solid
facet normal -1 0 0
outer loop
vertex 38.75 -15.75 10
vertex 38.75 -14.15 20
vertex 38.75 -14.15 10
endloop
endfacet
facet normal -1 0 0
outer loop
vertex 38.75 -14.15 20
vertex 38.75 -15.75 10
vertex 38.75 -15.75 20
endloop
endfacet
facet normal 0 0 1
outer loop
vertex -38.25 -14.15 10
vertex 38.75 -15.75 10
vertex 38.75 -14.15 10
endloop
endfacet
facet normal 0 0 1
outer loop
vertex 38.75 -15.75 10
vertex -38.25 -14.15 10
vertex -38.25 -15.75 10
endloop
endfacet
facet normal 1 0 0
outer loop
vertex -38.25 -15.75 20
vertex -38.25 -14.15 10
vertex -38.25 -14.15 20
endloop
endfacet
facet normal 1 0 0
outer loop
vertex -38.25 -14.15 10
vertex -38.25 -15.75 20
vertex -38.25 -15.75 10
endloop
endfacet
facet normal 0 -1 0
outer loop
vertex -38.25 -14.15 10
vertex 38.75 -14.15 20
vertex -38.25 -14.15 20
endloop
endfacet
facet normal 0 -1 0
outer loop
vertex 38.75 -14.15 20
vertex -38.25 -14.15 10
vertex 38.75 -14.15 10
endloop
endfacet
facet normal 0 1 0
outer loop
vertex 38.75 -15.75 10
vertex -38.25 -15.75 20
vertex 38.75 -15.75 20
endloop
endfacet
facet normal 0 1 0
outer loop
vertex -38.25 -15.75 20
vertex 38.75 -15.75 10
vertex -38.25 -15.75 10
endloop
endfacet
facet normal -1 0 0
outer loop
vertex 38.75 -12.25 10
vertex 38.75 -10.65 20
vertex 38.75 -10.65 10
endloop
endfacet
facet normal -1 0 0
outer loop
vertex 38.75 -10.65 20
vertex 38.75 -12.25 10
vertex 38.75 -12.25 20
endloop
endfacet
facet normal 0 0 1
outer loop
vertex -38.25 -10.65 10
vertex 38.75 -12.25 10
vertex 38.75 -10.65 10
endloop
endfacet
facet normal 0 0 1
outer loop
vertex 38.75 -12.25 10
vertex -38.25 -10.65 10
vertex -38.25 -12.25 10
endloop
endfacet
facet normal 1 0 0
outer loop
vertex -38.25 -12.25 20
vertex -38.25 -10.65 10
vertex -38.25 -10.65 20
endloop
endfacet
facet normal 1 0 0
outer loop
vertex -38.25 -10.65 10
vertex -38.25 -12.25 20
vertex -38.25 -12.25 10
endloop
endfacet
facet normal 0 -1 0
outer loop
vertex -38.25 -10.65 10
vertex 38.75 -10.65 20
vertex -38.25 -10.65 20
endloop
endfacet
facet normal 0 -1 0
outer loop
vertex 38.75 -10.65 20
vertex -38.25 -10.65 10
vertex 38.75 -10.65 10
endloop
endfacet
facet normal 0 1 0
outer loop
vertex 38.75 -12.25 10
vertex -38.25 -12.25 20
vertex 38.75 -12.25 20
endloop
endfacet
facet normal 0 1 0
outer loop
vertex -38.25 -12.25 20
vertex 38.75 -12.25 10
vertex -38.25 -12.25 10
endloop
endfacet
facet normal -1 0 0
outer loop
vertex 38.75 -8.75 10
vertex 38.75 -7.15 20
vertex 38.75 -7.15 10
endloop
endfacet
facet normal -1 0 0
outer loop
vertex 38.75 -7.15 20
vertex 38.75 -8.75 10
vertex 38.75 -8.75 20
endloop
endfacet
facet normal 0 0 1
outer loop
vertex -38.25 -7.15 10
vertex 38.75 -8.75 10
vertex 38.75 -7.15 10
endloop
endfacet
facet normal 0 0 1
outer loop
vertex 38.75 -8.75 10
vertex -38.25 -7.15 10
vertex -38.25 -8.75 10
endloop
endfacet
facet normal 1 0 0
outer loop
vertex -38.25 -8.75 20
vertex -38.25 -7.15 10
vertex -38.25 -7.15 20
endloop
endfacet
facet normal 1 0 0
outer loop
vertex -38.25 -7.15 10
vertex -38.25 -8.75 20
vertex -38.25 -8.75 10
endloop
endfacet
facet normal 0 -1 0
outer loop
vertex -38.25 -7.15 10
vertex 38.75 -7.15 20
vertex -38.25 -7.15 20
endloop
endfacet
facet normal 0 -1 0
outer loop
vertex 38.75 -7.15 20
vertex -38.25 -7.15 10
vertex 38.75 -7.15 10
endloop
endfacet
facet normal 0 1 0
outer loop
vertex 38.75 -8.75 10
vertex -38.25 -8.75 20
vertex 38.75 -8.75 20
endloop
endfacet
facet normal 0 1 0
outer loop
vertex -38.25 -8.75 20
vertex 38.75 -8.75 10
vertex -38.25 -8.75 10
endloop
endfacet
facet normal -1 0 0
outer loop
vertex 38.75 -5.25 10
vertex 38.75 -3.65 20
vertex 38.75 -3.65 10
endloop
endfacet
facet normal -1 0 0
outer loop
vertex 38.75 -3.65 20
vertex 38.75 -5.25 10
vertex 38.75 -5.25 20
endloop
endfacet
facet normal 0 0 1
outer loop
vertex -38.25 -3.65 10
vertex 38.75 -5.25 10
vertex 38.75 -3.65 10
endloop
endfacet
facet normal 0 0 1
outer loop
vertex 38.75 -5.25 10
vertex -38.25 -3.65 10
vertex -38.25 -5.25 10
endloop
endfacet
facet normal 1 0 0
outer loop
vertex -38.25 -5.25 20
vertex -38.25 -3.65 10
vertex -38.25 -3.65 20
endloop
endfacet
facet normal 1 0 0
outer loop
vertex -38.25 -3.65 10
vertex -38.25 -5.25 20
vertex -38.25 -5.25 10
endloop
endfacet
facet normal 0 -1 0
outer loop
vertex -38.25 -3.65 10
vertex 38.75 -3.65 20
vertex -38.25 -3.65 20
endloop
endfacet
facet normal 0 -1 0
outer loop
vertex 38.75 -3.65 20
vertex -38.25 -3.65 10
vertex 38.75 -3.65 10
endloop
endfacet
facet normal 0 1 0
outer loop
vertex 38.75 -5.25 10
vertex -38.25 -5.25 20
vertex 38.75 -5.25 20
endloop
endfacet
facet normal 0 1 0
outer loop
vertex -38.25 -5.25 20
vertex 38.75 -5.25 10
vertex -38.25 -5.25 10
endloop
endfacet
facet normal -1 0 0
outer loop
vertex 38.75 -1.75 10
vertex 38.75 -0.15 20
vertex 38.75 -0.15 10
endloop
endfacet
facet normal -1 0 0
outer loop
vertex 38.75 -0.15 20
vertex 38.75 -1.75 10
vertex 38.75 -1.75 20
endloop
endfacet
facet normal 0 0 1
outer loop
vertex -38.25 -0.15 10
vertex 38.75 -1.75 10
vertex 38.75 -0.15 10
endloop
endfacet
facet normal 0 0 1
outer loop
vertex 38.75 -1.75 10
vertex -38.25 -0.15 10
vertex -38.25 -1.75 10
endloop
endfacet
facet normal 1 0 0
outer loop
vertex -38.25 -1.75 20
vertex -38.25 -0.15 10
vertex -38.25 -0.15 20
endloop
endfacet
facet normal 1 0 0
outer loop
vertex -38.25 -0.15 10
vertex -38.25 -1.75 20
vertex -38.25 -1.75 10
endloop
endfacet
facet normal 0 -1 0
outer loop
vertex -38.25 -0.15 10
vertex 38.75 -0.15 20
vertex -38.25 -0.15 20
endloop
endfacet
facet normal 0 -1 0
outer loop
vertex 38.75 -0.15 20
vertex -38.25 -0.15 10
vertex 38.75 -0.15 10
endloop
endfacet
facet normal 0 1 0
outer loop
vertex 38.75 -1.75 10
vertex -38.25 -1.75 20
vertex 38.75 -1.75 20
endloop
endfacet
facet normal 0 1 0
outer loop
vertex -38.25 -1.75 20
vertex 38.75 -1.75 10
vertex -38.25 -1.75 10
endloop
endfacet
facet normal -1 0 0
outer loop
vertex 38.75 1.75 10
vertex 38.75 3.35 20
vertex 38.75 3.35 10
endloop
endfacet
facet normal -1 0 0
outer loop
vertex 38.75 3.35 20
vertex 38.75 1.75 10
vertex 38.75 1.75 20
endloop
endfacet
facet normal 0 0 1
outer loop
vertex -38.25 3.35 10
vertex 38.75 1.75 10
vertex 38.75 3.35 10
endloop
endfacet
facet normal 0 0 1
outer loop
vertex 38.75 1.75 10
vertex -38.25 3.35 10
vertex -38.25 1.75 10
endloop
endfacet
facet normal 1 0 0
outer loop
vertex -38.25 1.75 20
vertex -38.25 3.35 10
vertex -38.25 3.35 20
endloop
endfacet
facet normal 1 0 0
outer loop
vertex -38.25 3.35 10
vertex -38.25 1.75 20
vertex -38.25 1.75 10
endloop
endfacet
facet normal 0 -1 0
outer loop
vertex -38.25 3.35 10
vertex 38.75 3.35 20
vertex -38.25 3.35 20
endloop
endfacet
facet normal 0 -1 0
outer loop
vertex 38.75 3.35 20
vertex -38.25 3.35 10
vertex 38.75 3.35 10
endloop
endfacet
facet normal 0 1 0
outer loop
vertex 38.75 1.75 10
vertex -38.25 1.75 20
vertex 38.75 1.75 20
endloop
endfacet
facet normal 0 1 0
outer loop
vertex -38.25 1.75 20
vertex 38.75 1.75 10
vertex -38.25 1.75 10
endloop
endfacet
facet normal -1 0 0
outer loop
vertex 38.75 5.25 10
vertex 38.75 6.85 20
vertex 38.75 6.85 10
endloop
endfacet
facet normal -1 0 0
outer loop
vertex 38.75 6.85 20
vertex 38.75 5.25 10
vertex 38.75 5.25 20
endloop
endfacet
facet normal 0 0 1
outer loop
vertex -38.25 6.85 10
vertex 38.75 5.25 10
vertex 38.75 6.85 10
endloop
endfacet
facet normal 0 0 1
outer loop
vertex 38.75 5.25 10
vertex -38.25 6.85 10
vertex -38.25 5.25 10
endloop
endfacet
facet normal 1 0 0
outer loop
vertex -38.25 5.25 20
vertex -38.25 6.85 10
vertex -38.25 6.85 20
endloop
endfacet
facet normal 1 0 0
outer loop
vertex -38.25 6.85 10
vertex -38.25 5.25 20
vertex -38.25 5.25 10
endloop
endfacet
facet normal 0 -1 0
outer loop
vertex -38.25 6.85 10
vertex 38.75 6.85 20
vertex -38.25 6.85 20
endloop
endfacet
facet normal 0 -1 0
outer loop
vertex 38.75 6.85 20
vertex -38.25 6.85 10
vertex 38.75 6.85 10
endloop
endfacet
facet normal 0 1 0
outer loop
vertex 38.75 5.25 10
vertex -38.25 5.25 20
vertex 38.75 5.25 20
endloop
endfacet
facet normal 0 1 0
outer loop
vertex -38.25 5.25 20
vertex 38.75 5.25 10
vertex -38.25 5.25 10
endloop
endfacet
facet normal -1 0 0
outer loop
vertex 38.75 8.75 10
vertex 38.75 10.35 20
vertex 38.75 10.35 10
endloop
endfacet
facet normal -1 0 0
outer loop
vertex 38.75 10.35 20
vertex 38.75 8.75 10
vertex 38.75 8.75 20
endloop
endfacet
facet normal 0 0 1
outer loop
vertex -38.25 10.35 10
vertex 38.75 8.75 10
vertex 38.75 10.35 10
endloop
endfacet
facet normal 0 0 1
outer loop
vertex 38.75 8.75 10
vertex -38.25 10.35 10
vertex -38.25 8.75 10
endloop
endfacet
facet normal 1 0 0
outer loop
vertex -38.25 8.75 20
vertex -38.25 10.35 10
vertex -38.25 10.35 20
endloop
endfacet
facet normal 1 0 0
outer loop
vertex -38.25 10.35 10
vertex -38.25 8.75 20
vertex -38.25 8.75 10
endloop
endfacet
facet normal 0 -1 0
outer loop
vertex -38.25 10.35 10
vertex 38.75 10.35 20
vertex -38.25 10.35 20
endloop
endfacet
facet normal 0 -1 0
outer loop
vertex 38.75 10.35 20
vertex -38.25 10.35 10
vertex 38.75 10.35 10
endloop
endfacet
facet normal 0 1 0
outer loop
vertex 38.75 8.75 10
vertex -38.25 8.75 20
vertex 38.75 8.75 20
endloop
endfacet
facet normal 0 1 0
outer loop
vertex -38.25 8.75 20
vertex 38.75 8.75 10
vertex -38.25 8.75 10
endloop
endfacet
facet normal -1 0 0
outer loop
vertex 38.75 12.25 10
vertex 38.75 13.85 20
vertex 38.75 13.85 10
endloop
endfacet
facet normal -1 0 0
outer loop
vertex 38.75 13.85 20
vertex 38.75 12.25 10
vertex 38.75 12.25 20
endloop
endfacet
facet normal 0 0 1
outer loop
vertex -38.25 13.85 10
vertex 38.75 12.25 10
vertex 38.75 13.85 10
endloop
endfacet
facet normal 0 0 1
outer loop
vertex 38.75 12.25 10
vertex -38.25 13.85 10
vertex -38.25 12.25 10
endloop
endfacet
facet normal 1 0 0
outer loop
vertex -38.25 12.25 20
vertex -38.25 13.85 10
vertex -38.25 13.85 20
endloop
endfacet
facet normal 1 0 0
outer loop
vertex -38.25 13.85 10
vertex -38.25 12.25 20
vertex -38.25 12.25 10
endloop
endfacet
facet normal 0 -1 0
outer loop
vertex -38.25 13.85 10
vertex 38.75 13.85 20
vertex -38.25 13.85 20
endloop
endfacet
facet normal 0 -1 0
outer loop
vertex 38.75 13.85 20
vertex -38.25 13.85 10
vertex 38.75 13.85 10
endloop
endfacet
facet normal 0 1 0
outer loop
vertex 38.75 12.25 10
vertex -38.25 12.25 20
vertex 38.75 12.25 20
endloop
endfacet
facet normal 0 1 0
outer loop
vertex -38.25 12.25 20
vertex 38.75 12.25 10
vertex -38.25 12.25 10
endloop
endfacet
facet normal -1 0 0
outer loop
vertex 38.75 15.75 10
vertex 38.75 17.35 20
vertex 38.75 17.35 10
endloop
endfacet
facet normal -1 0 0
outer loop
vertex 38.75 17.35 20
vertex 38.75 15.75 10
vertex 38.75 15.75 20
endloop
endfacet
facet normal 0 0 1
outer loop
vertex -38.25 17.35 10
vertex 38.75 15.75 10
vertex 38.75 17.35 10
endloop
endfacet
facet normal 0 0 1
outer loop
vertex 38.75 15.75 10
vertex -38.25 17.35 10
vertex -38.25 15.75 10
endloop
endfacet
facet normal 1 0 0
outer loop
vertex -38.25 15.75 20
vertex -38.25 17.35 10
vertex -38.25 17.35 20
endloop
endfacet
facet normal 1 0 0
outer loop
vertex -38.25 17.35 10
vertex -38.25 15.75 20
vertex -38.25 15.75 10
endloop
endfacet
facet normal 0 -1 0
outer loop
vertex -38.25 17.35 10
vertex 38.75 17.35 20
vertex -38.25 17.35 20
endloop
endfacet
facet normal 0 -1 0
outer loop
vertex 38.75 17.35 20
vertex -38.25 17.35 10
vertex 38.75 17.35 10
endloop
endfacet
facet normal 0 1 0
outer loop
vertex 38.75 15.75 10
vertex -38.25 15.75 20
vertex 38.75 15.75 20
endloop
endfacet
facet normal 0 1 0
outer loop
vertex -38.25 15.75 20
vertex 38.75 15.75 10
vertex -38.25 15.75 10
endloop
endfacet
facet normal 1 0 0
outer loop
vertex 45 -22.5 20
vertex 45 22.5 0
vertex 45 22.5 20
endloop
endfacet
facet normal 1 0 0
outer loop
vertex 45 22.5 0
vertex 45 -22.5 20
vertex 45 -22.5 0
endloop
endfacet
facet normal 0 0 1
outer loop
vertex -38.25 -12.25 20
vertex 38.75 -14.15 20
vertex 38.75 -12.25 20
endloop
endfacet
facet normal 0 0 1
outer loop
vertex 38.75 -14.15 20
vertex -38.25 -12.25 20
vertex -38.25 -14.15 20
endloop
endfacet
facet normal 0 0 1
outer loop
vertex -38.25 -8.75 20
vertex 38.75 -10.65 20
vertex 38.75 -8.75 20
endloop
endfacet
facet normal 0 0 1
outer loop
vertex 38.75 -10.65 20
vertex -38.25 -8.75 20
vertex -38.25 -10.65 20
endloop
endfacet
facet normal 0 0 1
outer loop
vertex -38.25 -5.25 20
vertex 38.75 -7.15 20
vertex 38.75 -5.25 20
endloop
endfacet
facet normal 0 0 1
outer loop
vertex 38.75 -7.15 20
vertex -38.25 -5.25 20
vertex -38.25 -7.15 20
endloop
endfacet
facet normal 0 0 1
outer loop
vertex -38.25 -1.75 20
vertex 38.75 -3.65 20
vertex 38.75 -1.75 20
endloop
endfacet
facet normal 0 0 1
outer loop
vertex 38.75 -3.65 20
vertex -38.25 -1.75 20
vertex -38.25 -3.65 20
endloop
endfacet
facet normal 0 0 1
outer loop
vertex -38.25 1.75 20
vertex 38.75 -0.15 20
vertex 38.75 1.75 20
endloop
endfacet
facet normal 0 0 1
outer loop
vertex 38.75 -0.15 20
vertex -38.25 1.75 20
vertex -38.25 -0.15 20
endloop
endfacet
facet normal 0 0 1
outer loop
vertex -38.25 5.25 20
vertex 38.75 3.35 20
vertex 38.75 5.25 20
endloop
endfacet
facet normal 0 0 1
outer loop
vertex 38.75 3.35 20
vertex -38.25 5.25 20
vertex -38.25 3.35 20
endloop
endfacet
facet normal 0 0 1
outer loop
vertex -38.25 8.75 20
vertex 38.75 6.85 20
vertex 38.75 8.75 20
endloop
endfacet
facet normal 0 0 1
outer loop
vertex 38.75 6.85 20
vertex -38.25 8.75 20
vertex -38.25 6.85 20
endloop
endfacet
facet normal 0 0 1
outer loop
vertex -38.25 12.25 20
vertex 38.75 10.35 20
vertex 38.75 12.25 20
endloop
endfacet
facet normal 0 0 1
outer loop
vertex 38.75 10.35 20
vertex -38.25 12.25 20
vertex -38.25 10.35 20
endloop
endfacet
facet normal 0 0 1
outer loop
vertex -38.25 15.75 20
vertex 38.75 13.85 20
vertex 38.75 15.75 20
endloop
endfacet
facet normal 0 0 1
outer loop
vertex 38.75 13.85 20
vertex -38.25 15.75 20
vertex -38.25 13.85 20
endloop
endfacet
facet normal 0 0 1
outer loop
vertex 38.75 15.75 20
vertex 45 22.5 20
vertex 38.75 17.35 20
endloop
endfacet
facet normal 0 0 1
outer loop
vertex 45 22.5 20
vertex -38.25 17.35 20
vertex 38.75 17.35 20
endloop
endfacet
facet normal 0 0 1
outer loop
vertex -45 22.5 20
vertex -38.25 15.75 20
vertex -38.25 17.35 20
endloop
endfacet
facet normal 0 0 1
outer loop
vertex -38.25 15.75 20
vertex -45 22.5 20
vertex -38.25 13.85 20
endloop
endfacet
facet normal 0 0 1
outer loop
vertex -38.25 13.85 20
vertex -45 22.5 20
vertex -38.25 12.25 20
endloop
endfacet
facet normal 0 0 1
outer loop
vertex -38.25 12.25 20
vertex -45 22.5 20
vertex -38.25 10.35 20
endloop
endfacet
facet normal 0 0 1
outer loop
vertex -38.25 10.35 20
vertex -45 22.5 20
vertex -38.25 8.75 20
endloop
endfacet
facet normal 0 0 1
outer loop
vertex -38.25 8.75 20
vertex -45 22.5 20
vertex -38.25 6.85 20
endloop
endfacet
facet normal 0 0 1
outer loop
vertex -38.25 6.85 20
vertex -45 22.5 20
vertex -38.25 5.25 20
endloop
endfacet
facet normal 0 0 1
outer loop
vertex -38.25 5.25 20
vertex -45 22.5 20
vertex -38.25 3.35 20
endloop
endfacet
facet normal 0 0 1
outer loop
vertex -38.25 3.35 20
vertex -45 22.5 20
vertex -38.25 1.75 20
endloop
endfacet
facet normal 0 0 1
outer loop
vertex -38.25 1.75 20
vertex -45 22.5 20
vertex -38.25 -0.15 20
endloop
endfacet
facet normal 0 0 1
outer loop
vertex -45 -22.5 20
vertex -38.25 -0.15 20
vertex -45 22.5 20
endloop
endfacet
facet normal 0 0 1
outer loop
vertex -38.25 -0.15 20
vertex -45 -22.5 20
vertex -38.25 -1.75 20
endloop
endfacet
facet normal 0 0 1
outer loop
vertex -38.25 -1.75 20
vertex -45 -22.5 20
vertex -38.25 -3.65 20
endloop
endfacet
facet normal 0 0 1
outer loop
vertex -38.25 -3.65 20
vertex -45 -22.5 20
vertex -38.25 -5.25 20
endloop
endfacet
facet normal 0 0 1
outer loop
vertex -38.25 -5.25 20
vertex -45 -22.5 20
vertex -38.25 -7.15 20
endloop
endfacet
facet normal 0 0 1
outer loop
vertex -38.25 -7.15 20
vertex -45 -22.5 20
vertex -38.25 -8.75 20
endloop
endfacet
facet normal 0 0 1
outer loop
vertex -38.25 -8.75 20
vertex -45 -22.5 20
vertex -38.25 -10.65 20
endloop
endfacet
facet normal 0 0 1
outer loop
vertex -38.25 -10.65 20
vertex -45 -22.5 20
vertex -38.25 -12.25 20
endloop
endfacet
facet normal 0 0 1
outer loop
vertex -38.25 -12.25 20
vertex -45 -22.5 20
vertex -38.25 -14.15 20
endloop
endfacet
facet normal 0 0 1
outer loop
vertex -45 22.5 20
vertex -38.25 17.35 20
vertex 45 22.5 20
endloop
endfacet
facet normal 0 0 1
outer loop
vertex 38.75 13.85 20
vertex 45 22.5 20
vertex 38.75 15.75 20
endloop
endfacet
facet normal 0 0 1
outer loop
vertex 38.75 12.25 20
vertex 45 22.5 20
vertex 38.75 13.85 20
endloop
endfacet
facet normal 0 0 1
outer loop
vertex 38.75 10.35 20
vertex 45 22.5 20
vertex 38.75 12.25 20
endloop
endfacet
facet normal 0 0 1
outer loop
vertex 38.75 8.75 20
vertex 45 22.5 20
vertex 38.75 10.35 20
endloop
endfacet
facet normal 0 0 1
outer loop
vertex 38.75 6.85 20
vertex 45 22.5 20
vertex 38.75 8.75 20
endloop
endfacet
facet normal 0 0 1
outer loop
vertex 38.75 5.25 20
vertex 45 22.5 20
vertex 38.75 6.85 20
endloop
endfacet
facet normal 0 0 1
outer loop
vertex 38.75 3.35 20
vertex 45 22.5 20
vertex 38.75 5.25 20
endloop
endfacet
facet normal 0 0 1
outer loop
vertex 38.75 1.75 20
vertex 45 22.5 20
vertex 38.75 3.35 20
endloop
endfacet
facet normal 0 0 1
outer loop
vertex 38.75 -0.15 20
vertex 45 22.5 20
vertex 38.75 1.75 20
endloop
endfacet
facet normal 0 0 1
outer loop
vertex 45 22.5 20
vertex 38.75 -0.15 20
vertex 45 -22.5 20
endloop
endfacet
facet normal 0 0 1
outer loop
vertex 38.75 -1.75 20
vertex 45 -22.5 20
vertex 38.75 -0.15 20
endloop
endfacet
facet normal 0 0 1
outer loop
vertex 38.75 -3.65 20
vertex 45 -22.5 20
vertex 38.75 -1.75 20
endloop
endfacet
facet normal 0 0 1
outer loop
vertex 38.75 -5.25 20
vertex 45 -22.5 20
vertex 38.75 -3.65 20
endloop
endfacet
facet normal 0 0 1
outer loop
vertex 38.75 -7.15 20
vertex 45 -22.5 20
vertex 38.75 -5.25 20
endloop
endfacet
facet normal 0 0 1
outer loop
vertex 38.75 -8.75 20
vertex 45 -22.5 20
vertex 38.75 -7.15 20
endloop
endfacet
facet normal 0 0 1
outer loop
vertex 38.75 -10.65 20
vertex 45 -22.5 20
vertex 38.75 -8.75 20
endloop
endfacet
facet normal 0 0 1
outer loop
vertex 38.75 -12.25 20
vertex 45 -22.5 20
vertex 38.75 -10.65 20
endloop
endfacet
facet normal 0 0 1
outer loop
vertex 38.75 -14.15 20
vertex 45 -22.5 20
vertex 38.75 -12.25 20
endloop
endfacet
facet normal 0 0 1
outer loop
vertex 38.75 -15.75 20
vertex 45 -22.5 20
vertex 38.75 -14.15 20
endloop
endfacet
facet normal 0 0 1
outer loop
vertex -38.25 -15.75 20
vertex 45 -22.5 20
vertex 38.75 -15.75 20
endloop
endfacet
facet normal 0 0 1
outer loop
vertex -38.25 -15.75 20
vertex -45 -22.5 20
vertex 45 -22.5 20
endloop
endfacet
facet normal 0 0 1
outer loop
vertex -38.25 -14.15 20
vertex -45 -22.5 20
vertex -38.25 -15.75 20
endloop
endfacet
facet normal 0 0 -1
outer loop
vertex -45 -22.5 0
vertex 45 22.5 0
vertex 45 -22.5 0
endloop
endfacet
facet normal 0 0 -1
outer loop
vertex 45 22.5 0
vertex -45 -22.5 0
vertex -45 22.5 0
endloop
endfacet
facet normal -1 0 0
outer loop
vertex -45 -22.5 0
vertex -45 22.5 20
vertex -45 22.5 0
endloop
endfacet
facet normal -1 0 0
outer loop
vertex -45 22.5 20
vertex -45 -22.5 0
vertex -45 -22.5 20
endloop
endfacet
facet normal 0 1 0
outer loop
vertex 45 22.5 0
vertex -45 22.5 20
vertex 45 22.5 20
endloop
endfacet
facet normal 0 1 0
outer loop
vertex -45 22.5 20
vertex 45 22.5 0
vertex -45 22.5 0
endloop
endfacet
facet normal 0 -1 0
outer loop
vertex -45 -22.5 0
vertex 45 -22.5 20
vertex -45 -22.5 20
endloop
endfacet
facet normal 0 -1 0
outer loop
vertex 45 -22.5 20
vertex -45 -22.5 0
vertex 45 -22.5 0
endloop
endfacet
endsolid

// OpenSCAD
// Microscope slide drying rack
// Print orientation: base block on XY plane, slots open upward (+Z)

// ---------- Parameters ----------
block_len   = 90;    // block length along X (mm)
block_wid   = 45;    // block width along Y (mm)
block_ht    = 20;    // block height along Z (mm)

slot_count  = 10;    // number of slide slots
slot_len    = 77;    // slot length along X (mm)
slot_wid    = 1.6;   // slot width along Y (mm)
slot_depth  = 10;    // slot depth from top face (mm)
slot_pitch  = 3.5;   // centre-to-centre slot spacing along Y (mm)

eps         = 0.5;   // overcut past faces to avoid coplanar surfaces (mm)

$fn = 64;

// ---------- Derived ----------
slot_x0 = -slot_len / 2 + eps / 2;              // first slot start X
slot_y0 = -(slot_count - 1) * slot_pitch / 2;   // first slot centre Y

// ---------- Model ----------
difference() {
    // Base block
    translate([-block_len / 2, -block_wid / 2, 0])
        cube([block_len, block_wid, block_ht]);

    // Parallel slots along X, centred on block in X and Y
    for (i = [0 : slot_count - 1])
        translate([slot_x0, slot_y0 + i * slot_pitch, block_ht - slot_depth])
            cube([slot_len, slot_wid, slot_depth + eps]);
}
